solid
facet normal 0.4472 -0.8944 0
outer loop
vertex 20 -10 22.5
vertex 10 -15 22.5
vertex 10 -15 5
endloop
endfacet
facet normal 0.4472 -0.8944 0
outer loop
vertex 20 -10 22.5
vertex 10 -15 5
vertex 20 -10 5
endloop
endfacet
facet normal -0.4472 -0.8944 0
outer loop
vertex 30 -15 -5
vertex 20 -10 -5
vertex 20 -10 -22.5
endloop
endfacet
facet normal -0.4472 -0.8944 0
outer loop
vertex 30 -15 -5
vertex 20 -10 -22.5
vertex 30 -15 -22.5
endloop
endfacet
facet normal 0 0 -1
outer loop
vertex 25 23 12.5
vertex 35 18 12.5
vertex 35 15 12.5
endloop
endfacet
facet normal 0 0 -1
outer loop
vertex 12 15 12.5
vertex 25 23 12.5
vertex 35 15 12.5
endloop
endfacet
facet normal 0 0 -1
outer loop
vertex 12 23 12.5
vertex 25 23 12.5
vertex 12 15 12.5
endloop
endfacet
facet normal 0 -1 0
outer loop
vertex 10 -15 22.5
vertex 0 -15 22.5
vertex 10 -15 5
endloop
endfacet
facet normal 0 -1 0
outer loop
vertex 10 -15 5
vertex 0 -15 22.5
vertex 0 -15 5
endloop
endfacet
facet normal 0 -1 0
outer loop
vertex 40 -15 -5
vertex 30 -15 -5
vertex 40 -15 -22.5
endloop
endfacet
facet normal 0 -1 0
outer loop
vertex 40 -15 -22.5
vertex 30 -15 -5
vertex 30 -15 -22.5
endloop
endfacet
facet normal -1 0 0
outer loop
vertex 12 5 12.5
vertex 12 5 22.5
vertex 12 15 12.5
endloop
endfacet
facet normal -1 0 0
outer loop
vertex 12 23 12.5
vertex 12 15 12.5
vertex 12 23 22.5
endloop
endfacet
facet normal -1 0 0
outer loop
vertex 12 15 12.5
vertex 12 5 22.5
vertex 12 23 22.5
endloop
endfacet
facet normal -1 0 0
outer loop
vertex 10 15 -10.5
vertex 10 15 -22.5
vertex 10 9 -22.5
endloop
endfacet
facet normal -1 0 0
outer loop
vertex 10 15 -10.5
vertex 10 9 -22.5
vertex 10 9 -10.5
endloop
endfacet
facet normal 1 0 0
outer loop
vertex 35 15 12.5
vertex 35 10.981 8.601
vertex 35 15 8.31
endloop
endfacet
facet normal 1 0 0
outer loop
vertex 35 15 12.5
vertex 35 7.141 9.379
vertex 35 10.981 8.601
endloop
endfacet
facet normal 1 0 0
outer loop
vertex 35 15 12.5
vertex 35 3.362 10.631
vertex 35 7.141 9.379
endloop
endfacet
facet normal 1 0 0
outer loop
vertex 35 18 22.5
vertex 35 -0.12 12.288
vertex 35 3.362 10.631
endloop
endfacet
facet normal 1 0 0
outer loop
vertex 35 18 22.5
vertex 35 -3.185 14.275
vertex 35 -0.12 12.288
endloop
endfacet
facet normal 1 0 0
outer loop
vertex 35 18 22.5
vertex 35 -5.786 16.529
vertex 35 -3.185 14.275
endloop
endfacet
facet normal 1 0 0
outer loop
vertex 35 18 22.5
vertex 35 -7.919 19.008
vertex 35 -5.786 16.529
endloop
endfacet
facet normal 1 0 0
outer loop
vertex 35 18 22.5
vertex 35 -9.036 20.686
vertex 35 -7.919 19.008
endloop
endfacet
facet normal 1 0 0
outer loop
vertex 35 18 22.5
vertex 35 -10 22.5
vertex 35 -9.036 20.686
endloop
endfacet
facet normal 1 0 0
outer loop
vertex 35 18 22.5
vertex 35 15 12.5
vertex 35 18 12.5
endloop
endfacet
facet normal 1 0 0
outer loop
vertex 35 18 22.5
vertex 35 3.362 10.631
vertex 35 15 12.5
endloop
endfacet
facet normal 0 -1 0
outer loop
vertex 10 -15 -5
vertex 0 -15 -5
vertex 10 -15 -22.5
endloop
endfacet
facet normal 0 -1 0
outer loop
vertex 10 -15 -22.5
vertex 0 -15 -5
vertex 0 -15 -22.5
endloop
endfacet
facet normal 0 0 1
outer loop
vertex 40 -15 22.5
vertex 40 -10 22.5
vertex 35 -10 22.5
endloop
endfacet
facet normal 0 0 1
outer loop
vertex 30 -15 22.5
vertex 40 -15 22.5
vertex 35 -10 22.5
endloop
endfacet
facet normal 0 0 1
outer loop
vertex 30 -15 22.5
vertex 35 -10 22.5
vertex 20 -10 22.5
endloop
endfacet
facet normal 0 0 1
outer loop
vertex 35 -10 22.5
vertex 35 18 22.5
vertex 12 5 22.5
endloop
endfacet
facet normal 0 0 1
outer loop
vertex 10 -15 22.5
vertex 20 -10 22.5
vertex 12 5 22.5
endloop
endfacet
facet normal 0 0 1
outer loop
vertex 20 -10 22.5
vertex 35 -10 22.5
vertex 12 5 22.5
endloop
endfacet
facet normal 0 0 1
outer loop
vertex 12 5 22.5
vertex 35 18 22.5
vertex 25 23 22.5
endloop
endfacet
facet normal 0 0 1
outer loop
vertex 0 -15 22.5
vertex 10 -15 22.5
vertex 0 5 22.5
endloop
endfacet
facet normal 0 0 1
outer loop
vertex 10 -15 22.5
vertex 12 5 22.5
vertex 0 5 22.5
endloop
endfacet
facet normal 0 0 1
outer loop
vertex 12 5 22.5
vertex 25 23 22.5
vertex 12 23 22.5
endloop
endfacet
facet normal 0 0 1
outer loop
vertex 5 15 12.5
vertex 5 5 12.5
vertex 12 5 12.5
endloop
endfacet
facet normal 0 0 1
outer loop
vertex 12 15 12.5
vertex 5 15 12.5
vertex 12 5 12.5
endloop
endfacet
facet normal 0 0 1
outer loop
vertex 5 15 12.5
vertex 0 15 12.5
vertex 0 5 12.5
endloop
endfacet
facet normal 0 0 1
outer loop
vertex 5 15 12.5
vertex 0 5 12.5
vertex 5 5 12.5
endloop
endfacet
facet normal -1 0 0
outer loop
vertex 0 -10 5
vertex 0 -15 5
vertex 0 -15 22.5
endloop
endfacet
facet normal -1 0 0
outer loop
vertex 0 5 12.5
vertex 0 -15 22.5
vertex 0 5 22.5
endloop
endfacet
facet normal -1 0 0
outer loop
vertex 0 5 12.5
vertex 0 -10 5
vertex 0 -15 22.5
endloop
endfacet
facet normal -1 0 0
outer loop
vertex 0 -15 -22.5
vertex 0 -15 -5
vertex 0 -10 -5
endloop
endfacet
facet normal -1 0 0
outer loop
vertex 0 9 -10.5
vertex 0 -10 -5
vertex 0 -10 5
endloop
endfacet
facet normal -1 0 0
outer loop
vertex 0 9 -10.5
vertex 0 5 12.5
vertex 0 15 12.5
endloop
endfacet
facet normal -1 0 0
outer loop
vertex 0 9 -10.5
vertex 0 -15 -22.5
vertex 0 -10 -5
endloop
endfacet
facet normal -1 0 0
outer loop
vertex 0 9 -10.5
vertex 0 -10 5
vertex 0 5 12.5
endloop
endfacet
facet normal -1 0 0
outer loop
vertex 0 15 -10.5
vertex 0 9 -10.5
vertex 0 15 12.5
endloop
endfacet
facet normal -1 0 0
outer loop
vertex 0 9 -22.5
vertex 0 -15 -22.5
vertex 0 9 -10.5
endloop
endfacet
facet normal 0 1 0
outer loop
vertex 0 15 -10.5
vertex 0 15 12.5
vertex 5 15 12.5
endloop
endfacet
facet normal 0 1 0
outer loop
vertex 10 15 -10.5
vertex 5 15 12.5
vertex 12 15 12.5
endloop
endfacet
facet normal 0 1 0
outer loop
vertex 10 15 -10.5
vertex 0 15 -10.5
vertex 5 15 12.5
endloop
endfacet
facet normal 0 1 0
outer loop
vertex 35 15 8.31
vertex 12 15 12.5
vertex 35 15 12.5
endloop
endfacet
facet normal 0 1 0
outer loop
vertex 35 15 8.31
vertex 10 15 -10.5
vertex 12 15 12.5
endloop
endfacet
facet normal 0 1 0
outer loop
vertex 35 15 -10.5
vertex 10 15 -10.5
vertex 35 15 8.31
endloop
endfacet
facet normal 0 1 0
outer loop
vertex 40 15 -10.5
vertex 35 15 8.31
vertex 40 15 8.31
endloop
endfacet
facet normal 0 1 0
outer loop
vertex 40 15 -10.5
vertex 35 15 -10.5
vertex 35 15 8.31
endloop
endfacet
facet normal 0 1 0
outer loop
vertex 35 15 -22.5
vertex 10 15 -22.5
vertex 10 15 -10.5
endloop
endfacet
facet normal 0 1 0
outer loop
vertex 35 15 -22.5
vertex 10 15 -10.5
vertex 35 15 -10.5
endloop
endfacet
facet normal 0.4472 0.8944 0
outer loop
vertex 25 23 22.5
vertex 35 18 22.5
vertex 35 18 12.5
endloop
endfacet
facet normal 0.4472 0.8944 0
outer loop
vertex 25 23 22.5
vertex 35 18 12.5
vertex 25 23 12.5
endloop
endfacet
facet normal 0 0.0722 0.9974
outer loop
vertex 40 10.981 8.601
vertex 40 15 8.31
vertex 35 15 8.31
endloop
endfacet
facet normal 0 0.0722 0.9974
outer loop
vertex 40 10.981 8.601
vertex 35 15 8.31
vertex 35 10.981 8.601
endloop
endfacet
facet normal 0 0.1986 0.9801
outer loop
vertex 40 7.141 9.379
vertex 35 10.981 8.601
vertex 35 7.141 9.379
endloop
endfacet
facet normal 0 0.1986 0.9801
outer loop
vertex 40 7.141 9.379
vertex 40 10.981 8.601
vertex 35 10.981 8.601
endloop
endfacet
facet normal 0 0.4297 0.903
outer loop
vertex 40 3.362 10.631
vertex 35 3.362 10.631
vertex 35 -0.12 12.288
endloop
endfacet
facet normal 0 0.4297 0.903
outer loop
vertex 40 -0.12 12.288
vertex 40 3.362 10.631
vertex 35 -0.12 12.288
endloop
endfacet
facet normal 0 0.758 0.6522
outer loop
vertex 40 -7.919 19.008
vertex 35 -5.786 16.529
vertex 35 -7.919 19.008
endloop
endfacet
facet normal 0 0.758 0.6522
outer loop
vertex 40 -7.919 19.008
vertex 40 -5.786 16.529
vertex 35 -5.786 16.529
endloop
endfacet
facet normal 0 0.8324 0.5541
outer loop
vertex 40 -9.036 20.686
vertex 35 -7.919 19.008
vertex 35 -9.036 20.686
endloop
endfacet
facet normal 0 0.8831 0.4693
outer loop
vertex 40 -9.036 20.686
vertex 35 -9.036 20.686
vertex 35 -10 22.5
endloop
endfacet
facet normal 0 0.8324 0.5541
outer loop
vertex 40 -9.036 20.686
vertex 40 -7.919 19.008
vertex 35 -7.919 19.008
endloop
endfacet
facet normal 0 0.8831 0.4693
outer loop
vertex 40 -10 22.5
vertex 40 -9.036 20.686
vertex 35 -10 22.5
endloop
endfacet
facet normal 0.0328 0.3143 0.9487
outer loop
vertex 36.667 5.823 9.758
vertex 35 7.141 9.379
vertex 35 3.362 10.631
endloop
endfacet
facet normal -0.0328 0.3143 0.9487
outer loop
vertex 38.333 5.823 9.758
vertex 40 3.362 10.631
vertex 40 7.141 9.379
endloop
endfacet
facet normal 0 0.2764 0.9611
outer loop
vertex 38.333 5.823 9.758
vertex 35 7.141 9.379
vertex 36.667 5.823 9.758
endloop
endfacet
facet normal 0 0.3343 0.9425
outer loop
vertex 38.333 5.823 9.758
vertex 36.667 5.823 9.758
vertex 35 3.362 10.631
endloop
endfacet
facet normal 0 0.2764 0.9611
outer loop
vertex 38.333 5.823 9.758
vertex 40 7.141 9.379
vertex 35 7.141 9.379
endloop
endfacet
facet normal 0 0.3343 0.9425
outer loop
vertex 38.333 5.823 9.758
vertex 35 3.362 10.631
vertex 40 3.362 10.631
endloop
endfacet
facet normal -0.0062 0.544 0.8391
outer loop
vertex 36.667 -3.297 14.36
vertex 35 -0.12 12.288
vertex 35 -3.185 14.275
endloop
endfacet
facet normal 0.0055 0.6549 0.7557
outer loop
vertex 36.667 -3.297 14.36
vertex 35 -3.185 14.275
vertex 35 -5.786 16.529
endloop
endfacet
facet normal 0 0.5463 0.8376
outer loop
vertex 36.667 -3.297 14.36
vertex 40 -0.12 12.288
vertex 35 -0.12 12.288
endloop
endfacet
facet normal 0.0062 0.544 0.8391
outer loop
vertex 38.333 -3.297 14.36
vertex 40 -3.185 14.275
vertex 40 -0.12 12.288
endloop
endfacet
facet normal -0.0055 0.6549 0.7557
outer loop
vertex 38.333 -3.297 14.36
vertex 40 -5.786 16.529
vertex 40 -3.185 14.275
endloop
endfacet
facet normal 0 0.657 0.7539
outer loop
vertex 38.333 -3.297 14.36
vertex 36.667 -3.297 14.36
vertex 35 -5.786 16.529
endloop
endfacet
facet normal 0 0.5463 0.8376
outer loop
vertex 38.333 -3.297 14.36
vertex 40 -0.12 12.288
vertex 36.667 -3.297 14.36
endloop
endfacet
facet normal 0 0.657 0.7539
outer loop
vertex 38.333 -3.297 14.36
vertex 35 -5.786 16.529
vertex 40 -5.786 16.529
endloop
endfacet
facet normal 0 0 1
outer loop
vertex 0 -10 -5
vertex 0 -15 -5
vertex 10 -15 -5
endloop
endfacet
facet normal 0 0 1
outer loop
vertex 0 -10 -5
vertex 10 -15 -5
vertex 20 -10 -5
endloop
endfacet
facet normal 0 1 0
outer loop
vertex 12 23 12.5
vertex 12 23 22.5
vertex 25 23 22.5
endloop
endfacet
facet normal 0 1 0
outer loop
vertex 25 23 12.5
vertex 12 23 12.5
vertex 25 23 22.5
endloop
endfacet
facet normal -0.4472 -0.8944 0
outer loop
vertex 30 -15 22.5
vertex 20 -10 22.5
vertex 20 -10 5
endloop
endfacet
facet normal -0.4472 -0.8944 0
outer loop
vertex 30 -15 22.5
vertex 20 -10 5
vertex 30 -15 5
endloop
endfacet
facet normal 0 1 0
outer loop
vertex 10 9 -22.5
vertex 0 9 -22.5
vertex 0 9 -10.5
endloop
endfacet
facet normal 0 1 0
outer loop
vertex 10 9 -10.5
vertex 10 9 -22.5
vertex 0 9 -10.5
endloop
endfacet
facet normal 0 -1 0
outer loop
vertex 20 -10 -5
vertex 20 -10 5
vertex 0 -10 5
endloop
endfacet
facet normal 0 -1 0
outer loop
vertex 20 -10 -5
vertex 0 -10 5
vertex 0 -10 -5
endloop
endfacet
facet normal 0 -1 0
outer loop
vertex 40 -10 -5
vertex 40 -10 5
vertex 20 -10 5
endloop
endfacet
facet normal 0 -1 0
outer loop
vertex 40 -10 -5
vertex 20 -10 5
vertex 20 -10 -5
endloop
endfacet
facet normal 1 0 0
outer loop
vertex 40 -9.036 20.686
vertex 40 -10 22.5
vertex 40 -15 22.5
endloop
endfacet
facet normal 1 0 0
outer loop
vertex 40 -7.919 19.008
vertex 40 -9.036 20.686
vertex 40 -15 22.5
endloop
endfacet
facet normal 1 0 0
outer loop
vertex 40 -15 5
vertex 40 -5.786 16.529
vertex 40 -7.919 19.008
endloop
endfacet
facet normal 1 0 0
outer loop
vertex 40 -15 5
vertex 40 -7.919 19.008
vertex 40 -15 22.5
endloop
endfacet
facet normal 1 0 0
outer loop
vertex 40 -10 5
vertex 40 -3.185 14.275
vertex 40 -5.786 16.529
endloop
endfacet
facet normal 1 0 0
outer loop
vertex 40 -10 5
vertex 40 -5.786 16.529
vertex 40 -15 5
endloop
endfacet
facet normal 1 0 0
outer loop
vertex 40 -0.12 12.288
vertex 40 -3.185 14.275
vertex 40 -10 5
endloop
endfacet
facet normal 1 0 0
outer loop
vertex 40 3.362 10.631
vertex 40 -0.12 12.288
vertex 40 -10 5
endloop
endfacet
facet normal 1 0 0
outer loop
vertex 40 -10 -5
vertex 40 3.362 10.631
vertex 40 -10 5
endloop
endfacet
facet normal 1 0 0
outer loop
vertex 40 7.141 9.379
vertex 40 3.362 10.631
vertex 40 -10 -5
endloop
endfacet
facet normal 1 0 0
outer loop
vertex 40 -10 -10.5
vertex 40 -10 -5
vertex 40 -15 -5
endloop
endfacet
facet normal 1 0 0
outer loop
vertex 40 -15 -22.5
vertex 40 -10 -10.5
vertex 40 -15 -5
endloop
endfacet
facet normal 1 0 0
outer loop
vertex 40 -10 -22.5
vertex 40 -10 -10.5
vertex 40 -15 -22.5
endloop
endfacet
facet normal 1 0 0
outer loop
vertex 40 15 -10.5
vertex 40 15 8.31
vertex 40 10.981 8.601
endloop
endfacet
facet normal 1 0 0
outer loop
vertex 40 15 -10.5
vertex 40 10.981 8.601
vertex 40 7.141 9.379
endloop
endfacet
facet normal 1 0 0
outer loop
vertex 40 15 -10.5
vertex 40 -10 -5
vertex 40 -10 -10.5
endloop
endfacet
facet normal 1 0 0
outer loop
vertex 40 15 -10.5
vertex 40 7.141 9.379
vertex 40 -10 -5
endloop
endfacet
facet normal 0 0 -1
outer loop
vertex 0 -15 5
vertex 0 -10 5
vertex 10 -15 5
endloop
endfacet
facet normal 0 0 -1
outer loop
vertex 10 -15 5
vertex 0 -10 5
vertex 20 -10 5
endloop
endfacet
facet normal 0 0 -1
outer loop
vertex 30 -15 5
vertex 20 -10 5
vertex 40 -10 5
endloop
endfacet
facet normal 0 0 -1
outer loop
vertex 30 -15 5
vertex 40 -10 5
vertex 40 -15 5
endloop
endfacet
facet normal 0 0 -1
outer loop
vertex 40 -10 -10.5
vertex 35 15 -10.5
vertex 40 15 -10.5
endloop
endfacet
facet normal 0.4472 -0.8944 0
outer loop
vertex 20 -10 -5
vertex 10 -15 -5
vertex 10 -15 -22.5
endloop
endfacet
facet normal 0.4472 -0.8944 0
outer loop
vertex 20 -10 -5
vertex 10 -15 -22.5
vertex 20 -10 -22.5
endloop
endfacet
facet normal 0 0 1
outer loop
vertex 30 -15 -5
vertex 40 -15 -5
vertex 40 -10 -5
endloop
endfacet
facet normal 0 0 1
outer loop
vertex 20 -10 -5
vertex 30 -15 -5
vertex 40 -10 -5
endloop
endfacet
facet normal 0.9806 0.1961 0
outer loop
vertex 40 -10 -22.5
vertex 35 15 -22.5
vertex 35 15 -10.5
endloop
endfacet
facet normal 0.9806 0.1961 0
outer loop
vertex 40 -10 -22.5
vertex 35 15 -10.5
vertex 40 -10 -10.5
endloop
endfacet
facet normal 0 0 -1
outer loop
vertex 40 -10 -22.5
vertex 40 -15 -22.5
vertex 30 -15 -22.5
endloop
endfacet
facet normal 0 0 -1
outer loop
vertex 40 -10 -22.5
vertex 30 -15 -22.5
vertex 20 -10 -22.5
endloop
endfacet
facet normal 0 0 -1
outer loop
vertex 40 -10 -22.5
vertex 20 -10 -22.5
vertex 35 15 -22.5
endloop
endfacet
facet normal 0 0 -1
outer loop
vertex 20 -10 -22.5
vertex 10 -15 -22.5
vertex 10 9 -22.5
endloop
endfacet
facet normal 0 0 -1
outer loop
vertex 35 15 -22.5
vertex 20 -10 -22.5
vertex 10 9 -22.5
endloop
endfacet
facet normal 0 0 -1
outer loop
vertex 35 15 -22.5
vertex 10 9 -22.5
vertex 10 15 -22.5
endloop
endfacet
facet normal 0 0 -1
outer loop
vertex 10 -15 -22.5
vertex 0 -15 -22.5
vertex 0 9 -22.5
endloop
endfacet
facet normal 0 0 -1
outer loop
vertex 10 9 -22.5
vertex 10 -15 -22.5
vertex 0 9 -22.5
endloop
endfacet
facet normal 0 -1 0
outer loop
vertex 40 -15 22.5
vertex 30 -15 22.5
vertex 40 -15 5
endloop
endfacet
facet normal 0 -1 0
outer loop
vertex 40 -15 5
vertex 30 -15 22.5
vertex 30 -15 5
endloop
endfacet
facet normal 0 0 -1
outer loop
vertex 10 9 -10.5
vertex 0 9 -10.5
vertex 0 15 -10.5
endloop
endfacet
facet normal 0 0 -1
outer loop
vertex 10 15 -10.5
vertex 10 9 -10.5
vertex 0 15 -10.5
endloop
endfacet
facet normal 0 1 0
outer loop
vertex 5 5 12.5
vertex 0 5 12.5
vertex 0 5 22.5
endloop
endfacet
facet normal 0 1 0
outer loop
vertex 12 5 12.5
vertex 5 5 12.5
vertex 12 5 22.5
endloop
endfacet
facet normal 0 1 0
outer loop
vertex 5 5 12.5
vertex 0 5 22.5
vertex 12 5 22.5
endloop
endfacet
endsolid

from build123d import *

# Parameters (mm, degrees)
SKETCH_1_W          = 45
SKETCH_1_H          = 30
EXTRUDE_1_DEPTH     = 40
SKETCH_2_W          = 10
SKETCH_2_H          = 3
SKETCH_2_H_2        = 2
CUT_EXTRUDE_1_DEPTH = 49.28301979
CUT_EXTRUDE_2_DEPTH = 5
CUT_EXTRUDE_3_DEPTH = 12
CUT_EXTRUDE_4_DEPTH = 63.048368391
SKETCH_6_W          = 5
SKETCH_6_H          = 10
CUT_EXTRUDE_5_DEPTH = 14.19009
EXTRUDE_2_DEPTH     = 10
SKETCH_8_W          = 12
SKETCH_8_H          = 6
CUT_EXTRUDE_6_DEPTH = 10
SKETCH_9_W          = 12
SKETCH_9_H          = 18
CUT_EXTRUDE_7_DEPTH = 10
EXTRUDE_START       = -1e-06
SKETCH_10_W         = 5
SKETCH_10_H         = 10
EXTRUDE_3_DEPTH     = 4.19009
EXTRUDE_4_DEPTH     = 10


with BuildPart() as part:
    # Эскиз1 → Бобышка-Вытянуть1 (new body)
    with BuildSketch(Plane(origin=(0, 0, 0), x_dir=(0, 0, -1), z_dir=(1, 0, 0))):
        Rectangle(SKETCH_1_W, SKETCH_1_H)
    extrude(amount=EXTRUDE_1_DEPTH)

    # Эскиз2 → Вырез-Вытянуть1 (cut, through all)
    with BuildSketch(Plane(origin=(40, 0, 0), x_dir=(0, 0, -1), z_dir=(1, 0, 0))):
        with Locations((0, -11.5)):
            Rectangle(SKETCH_2_W, SKETCH_2_H)
        with Locations((0, -14)):
            Rectangle(SKETCH_2_W, SKETCH_2_H_2)
    extrude(amount=-CUT_EXTRUDE_1_DEPTH, mode=Mode.SUBTRACT)

    # Эскиз3 → Вырез-Вытянуть2 (cut)
    with BuildSketch(Plane(origin=(40, 0, 0), x_dir=(0, 0, -1), z_dir=(1, 0, 0))):
        with BuildLine():
            Line((-22.5, 15), (-22.5, -10))
            add(Edge.make_bspline(
                [(-8.309911122, 15), (-8.309911122, 6.581189356), (-12.462330184, -5.292395359), (-22.5, -10)],
                knots=[0, 0, 0, 0, 1, 1, 1, 1], degree=3))
            Line((-8.309911122, 15), (-22.5, 15))
        make_face()
    extrude(amount=-CUT_EXTRUDE_2_DEPTH, mode=Mode.SUBTRACT)

    # Эскиз4 → Вырез-Вытянуть3 (cut)
    with BuildSketch(Plane(origin=(0, 0, -22.5), x_dir=(-1, 0, 0), z_dir=(0, 0, -1))):
        Polygon((-40, 15), (-35, 15), (-40, -10), align=None)
    extrude(amount=-CUT_EXTRUDE_3_DEPTH, mode=Mode.SUBTRACT)

    # Эскиз5 → Вырез-Вытянуть4 (cut, through all)
    with BuildSketch(Plane.XY.offset(22.5)):
        Polygon((20, -10), (30, -15), (10, -15), align=None)
    extrude(amount=-CUT_EXTRUDE_4_DEPTH, mode=Mode.SUBTRACT)

    # Эскиз6 → Вырез-Вытянуть5 (cut)
    with BuildSketch(Plane.XY.offset(22.5)):
        with Locations((2.5, 10)):
            Rectangle(SKETCH_6_W, SKETCH_6_H)
    extrude(amount=-CUT_EXTRUDE_5_DEPTH, mode=Mode.SUBTRACT)

    # Эскиз7 → Бобышка-Вытянуть2 (add)
    with BuildSketch(Plane.XY.offset(22.5)):
        Polygon((35, 15), (35, 18), (25, 23), (15, 23), (5, 18), (5, 15), align=None)
    extrude(amount=-EXTRUDE_2_DEPTH)

    # Эскиз8 → Вырез-Вытянуть6 (cut)
    with BuildSketch(Plane.ZY):
        with Locations((-16.5, 12)):
            Rectangle(SKETCH_8_W, SKETCH_8_H)
    extrude(amount=-CUT_EXTRUDE_6_DEPTH, mode=Mode.SUBTRACT)

    # Эскиз9 → Вырез-Вытянуть7 (cut)
    with BuildSketch(Plane.XY.offset(22.5)):
        with Locations((6, 14)):
            Rectangle(SKETCH_9_W, SKETCH_9_H)
    extrude(amount=-CUT_EXTRUDE_7_DEPTH, mode=Mode.SUBTRACT)

    # Эскиз10 → Бобышка-Вытянуть3 (add)
    with BuildSketch(Plane.XY.offset(8.309911122).offset(EXTRUDE_START)):
        with Locations((2.5, 10)):
            Rectangle(SKETCH_10_W, SKETCH_10_H)
    extrude(amount=EXTRUDE_3_DEPTH)

    # Эскиз11 → Бобышка-Вытянуть4 (add)
    with BuildSketch(Plane.XY.offset(22.5)):
        Polygon((15, 23), (12, 21.5), (12, 23), align=None)
    extrude(amount=-EXTRUDE_4_DEPTH)


solid = part.part
